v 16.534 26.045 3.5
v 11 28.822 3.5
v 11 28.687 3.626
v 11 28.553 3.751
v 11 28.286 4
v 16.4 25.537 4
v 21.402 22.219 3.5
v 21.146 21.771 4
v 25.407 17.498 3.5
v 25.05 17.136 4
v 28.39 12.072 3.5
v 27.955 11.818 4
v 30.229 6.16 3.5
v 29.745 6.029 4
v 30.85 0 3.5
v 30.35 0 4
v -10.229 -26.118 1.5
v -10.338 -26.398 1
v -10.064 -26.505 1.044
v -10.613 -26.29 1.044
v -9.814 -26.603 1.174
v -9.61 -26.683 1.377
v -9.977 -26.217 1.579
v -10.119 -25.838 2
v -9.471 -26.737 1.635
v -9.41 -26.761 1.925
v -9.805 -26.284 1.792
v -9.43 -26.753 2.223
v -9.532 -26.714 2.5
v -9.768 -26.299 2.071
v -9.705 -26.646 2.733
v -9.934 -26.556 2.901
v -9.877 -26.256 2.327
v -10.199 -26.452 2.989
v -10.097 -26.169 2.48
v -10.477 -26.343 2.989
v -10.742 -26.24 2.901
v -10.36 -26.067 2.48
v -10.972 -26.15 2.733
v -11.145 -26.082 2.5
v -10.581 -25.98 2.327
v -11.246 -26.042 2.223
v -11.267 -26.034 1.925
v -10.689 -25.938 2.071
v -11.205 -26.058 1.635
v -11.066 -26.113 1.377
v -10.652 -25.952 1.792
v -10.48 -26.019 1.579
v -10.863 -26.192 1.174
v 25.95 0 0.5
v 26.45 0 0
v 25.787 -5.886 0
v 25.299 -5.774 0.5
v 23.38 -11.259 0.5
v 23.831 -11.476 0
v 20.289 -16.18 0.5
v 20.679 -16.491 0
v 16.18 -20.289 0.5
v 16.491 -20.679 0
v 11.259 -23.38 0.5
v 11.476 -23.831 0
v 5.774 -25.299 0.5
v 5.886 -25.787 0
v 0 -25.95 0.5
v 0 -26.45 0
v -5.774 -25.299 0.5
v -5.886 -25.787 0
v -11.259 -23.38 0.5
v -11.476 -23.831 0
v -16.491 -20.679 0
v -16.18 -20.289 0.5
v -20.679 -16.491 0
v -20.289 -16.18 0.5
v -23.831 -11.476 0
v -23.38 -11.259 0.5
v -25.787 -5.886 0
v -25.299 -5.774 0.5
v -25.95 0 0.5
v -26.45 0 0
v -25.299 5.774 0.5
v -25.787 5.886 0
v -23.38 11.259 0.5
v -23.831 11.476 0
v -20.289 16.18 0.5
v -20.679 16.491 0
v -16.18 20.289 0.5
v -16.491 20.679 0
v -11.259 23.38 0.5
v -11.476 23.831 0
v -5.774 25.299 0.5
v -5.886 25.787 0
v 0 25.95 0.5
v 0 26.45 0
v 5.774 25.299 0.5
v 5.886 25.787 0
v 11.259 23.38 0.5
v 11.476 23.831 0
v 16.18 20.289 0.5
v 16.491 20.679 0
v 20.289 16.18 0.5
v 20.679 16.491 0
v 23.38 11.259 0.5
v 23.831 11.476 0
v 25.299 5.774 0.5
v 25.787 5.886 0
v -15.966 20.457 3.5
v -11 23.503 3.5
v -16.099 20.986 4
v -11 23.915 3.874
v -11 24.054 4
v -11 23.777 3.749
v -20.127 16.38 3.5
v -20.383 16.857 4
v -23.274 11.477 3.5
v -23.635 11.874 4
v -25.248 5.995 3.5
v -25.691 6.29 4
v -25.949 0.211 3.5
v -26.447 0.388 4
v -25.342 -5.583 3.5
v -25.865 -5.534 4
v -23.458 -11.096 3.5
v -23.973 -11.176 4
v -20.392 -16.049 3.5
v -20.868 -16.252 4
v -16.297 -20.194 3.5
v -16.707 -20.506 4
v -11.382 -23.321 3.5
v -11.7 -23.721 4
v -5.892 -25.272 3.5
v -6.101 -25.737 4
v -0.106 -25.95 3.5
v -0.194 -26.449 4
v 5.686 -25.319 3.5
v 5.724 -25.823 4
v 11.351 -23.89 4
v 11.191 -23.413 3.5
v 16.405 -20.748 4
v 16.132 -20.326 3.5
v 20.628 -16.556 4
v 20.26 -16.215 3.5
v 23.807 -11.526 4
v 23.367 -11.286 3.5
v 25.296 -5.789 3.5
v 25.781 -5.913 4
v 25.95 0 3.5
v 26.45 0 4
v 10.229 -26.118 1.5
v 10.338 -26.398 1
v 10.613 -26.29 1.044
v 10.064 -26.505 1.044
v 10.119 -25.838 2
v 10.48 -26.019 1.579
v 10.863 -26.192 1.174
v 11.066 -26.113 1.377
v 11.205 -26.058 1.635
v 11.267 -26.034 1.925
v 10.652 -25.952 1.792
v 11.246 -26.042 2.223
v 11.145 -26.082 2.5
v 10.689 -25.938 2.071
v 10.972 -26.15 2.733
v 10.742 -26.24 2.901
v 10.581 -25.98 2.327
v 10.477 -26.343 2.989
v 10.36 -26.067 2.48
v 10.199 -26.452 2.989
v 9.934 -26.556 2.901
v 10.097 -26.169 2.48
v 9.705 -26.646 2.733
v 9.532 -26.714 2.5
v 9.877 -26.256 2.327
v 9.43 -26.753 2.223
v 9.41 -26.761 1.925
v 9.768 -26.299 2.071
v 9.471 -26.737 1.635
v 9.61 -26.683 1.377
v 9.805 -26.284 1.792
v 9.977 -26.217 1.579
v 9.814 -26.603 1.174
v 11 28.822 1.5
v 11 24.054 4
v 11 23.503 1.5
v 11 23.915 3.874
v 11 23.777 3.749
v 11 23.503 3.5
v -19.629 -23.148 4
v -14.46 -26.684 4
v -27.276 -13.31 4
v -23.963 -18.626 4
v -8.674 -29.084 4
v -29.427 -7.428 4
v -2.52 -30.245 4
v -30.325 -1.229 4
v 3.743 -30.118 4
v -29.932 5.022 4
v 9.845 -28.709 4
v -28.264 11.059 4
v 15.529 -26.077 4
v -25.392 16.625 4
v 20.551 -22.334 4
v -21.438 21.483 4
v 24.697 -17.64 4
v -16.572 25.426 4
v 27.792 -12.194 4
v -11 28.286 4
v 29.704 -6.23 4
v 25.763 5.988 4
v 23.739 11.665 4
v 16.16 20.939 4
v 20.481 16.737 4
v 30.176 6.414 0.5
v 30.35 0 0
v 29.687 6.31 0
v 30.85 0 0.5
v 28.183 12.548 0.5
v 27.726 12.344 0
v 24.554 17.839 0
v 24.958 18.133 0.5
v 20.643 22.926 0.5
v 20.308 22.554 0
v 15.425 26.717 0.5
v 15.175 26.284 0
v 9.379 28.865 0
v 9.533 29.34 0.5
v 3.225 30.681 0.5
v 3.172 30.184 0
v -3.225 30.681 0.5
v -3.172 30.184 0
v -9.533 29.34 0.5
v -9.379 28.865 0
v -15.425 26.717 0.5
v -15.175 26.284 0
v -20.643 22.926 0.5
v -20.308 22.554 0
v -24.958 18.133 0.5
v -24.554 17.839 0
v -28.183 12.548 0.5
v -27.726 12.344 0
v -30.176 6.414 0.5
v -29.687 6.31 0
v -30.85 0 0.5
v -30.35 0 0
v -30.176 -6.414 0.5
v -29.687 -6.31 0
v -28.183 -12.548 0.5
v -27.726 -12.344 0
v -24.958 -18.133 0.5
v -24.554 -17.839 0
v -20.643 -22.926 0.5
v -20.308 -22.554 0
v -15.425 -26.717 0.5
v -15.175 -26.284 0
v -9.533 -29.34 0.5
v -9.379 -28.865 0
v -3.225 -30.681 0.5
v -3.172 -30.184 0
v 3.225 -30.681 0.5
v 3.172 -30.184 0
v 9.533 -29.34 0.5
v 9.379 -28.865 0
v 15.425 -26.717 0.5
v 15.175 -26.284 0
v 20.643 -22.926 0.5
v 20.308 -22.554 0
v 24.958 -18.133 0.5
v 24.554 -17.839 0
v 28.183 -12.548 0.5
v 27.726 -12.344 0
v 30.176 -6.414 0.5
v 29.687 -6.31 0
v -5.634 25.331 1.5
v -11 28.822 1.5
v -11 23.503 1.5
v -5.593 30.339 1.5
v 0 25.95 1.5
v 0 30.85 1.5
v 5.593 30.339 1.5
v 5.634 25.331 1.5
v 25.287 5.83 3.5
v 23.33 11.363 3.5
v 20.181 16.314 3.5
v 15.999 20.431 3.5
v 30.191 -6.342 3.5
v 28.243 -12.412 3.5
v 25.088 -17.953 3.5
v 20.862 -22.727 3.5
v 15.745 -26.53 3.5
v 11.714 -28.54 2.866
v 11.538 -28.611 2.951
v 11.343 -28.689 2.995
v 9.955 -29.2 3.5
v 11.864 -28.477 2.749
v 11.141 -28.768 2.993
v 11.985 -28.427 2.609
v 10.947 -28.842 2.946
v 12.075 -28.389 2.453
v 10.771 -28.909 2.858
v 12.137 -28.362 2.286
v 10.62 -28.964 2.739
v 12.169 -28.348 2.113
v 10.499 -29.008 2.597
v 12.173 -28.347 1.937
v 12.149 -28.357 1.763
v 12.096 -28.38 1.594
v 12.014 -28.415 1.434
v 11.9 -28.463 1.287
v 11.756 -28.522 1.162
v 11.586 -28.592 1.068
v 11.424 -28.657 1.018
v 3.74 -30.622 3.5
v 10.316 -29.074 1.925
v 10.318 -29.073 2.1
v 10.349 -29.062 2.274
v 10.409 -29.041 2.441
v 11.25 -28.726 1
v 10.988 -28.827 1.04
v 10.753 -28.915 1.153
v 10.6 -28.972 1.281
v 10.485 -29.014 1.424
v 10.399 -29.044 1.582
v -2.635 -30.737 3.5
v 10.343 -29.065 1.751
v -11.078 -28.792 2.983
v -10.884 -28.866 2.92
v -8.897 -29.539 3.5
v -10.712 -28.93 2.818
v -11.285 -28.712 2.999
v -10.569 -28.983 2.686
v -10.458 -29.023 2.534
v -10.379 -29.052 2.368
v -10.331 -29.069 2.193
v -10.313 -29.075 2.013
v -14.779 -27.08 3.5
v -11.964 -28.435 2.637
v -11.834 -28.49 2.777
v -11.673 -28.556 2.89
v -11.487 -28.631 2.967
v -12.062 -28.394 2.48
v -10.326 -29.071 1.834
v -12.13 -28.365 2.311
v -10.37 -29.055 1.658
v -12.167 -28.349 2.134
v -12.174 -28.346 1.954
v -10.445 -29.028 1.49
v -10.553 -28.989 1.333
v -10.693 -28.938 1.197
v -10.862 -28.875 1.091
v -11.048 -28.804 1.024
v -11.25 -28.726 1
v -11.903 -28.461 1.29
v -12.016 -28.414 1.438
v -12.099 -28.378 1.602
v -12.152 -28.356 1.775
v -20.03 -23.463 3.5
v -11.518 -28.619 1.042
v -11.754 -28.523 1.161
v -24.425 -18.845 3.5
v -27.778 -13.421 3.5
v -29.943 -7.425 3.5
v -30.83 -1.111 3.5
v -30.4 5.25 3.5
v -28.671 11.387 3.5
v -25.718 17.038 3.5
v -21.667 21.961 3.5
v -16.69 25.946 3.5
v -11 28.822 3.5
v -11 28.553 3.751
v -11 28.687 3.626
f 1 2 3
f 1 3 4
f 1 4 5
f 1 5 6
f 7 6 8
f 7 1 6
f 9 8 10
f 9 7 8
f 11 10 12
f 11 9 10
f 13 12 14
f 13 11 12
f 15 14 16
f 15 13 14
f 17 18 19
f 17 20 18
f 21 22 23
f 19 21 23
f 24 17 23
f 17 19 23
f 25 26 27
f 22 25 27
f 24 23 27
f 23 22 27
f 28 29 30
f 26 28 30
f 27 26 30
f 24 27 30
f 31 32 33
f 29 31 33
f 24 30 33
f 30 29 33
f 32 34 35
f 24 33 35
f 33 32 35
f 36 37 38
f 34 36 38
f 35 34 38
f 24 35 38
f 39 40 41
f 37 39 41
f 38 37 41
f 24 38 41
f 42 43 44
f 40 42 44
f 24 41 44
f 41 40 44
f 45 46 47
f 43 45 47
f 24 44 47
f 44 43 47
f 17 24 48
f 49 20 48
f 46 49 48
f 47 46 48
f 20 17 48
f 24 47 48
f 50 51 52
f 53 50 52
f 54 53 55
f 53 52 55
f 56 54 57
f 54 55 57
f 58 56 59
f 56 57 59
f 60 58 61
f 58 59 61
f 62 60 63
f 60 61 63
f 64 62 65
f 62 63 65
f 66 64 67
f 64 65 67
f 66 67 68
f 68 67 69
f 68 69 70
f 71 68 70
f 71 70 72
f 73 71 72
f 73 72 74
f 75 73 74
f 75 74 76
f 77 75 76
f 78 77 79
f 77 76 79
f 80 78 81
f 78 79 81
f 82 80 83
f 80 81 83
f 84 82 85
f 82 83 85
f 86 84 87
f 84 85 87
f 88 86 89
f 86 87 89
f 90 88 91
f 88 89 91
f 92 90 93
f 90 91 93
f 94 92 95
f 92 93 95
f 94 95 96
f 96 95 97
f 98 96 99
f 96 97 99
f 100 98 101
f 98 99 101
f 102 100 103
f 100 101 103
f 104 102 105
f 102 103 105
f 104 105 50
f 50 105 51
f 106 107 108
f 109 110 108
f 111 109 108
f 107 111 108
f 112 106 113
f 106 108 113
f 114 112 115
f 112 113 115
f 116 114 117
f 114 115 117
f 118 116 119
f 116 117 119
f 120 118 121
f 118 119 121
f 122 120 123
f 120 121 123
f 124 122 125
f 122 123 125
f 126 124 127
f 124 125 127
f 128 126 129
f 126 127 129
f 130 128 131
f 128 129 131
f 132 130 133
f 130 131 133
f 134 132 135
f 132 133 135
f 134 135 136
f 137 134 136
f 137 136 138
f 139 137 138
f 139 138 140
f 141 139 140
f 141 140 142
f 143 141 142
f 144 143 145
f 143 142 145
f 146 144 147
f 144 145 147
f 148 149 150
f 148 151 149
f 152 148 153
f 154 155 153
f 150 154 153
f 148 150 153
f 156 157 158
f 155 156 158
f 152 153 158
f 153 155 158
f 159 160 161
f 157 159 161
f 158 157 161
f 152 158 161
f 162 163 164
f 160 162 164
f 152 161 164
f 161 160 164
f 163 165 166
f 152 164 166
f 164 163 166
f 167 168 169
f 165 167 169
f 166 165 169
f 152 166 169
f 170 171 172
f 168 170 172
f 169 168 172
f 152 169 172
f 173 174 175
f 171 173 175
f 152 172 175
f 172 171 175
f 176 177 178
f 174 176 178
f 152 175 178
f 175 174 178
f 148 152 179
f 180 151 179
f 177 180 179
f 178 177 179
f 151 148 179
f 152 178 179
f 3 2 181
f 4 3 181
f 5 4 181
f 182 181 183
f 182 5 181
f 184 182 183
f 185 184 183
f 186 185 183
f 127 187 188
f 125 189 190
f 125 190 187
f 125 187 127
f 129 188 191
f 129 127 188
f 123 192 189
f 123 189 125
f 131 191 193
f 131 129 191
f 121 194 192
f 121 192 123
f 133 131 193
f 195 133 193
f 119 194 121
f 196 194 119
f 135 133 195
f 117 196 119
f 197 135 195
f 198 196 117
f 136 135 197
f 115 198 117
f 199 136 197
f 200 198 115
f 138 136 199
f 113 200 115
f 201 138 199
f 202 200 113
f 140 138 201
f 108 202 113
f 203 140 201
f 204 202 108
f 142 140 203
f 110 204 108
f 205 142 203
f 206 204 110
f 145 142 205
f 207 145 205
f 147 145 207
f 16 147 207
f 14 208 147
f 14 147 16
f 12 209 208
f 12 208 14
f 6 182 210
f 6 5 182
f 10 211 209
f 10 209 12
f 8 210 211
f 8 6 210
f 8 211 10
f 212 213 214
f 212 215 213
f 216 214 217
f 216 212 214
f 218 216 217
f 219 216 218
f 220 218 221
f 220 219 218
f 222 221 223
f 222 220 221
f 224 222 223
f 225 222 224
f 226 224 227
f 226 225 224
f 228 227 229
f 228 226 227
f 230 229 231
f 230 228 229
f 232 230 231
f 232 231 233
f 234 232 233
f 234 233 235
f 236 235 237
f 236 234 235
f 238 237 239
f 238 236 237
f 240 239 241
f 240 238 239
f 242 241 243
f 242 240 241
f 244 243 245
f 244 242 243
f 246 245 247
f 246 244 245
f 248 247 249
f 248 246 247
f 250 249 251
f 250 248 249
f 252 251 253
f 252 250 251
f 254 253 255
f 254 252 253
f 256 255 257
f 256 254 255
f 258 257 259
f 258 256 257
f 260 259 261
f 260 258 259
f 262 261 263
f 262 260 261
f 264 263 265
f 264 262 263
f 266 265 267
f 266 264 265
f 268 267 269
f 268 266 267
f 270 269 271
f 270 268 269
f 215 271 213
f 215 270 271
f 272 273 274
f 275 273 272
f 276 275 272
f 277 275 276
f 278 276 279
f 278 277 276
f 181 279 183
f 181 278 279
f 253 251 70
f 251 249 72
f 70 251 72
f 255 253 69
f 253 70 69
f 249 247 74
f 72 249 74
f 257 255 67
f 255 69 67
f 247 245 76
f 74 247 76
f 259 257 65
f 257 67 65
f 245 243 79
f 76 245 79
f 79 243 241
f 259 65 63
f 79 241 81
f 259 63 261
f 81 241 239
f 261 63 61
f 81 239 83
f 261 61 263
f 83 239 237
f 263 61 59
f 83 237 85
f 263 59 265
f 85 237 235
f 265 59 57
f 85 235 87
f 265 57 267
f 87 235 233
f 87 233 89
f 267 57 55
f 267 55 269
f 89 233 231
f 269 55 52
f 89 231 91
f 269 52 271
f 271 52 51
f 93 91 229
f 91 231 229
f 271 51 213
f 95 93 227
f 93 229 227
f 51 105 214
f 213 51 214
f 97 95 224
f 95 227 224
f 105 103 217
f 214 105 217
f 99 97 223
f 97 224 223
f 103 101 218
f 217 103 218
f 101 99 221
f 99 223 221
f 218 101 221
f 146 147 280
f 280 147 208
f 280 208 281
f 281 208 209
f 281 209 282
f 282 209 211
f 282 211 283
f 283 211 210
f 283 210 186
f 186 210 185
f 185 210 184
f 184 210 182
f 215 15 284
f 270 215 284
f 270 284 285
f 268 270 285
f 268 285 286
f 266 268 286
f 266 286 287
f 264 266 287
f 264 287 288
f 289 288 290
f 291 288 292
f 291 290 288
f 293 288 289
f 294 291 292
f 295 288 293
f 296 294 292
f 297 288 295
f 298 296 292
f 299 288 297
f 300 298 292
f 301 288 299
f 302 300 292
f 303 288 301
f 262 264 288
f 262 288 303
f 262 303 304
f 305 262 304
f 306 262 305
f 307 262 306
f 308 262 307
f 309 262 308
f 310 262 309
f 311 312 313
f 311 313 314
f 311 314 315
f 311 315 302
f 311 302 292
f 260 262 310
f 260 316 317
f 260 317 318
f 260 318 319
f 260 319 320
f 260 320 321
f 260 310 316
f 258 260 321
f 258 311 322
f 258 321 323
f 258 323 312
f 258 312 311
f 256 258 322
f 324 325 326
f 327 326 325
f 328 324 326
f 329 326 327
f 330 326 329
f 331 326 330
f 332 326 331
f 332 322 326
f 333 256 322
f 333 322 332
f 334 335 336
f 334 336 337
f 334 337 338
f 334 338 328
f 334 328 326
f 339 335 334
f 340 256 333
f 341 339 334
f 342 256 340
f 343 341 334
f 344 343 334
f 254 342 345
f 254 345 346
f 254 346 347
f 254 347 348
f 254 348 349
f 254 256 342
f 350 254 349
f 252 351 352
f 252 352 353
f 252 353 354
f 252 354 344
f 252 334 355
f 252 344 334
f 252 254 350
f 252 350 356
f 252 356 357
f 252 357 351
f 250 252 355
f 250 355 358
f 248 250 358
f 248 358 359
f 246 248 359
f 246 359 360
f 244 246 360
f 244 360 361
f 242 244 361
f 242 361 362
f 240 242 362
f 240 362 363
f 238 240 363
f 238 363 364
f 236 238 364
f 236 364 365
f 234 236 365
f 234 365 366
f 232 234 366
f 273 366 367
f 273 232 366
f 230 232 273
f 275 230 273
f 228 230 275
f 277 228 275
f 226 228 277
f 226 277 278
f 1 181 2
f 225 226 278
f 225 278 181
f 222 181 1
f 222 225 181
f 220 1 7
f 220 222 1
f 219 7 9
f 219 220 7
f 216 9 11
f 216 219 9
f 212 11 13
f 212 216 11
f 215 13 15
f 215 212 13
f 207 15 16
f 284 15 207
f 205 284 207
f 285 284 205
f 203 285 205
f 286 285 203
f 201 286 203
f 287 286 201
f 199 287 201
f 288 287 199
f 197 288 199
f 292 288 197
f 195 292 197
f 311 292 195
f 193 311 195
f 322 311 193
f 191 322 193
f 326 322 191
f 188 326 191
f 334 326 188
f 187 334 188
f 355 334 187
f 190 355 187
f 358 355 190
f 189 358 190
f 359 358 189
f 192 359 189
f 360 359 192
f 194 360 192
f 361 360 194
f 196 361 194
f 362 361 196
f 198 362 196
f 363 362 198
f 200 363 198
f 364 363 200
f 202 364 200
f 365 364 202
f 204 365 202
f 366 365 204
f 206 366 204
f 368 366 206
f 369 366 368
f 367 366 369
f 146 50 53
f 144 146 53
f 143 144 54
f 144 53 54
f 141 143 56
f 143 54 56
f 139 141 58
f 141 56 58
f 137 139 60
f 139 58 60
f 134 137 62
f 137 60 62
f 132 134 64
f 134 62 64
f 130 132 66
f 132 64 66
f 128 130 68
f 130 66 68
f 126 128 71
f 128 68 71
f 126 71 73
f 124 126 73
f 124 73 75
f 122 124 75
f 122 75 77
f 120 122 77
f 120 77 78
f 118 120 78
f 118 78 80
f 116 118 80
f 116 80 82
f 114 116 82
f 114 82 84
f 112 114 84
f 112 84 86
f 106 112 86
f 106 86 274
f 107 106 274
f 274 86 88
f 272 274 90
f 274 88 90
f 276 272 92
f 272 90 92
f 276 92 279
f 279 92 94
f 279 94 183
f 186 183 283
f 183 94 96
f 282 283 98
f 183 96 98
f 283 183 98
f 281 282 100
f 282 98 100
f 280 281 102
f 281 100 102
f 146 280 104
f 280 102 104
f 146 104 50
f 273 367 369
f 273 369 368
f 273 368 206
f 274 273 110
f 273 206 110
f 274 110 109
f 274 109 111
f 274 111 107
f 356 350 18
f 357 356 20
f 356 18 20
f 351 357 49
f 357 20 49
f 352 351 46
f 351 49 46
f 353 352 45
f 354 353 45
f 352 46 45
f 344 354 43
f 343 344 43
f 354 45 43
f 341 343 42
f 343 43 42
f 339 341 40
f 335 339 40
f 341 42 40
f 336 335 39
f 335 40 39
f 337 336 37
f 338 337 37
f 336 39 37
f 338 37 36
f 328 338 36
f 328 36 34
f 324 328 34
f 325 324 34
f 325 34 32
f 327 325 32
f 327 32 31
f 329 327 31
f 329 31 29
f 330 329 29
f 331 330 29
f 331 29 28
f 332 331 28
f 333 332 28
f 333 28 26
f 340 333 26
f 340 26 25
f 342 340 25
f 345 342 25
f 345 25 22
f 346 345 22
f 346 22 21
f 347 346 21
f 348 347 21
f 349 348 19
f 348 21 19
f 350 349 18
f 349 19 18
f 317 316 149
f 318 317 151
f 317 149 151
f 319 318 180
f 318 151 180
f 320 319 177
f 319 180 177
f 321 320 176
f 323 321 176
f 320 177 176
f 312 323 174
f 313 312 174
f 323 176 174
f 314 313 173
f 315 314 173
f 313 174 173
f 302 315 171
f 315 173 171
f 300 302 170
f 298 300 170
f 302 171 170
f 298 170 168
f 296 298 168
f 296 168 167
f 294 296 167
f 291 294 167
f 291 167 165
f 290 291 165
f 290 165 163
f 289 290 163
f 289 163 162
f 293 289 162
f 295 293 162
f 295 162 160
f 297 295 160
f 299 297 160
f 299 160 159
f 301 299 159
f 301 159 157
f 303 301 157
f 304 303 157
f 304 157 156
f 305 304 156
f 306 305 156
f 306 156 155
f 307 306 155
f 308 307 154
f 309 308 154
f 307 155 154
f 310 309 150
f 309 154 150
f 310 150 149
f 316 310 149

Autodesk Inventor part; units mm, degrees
sketch "草圖1" plane through (0, 0, 0) normal (0, 0, 1) x (1, 0, 0)
  circle A0 centre (0, 0) radius 30.85
  circle A1 centre (0, 0) radius 25.95
  dimension "d0" = 61.7
  dimension "d3" = 51.9
extrude "擠出1" add sketch "草圖1" along normal blind 4
sketch "草圖2" plane through (0, 0, 4) normal (0, 0, 1) x (1, 0, 0)
  circle A0 centre (0, 0) radius 25.95 projected
  circle A1 centre (0, 0) radius 30.85 projected
  line L0 (0, 0) -> (0, 30.85)
  line L1 (11, 28.8223) -> (11, 23.5032)
  line L2 (-11, 28.8223) -> (-11, 23.5032)
  dimension "d6" = 22
extrude "擠出2" cut sketch "草圖2" against normal blind 2.5 contours A0 L0 A1 L1 | L2 A1 L0 A0
ref_plane "工作平面1" through (0, 0, 2) normal (0, 0, 1) x (1, 0, 0)
sketch "草圖3" plane through (0, 0, 2) normal (0, 0, 1) x (1, 0, 0)
  line L0 (0, 0) -> (0, -42.4806)
  line L1 (0, 0) -> (-11.25, -28.7256)
  line L2 (0, 0) -> (11.25, -28.7256)
  arc A0 (-11, 28.8223) -> (11, 28.8223) centre (0, 0) ccw projected
  line L3 (-11.25, -28.7256) -> (11.25, -28.7256)
  dimension "d9" = 22.5
ref_plane "工作平面2" through (11.25, -28.7256, 2) normal (0.3647, -0.9311, 0) x (0.9311, 0.3647, 0)
ref_plane "工作平面3" through (-11.25, -28.7256, 2) normal (-0.3647, -0.9311, 0) x (0.9311, -0.3647, 0)
sketch "草圖4" plane through (11.25, -28.7256, 2) normal (0.3647, -0.9311, 0) x (0.9311, 0.3647, 0)
  point P0 (0, -2)
  point P1 (0, 0)
hole "孔1" at (11.25, -28.7256, 2) direction (-0.3647, 0.9311, 0) diameter 2 depth 2.5 tip angle 118
sketch "草圖5" plane through (-11.25, -28.7256, 2) normal (-0.3647, -0.9311, 0) x (0.9311, -0.3647, 0)
  point P0 (0, -2)
  point P1 (0, 0)
hole "孔2" at (-11.25, -28.7256, 2) direction (0.3647, 0.9311, 0) diameter 2 depth 2.5 tip angle 118
chamfer "倒角1" distance 0.5 angle 45 6 edges at (-13.9275, -21.8958, 4) (21.8958, 13.9275, 4) (-25.95, 0, 0) (-17.4982, -25.4074, 4) (25.4074, 17.4982, 4) (-30.85, 0, 0)
properties part number "KE-SP-02-P1"
